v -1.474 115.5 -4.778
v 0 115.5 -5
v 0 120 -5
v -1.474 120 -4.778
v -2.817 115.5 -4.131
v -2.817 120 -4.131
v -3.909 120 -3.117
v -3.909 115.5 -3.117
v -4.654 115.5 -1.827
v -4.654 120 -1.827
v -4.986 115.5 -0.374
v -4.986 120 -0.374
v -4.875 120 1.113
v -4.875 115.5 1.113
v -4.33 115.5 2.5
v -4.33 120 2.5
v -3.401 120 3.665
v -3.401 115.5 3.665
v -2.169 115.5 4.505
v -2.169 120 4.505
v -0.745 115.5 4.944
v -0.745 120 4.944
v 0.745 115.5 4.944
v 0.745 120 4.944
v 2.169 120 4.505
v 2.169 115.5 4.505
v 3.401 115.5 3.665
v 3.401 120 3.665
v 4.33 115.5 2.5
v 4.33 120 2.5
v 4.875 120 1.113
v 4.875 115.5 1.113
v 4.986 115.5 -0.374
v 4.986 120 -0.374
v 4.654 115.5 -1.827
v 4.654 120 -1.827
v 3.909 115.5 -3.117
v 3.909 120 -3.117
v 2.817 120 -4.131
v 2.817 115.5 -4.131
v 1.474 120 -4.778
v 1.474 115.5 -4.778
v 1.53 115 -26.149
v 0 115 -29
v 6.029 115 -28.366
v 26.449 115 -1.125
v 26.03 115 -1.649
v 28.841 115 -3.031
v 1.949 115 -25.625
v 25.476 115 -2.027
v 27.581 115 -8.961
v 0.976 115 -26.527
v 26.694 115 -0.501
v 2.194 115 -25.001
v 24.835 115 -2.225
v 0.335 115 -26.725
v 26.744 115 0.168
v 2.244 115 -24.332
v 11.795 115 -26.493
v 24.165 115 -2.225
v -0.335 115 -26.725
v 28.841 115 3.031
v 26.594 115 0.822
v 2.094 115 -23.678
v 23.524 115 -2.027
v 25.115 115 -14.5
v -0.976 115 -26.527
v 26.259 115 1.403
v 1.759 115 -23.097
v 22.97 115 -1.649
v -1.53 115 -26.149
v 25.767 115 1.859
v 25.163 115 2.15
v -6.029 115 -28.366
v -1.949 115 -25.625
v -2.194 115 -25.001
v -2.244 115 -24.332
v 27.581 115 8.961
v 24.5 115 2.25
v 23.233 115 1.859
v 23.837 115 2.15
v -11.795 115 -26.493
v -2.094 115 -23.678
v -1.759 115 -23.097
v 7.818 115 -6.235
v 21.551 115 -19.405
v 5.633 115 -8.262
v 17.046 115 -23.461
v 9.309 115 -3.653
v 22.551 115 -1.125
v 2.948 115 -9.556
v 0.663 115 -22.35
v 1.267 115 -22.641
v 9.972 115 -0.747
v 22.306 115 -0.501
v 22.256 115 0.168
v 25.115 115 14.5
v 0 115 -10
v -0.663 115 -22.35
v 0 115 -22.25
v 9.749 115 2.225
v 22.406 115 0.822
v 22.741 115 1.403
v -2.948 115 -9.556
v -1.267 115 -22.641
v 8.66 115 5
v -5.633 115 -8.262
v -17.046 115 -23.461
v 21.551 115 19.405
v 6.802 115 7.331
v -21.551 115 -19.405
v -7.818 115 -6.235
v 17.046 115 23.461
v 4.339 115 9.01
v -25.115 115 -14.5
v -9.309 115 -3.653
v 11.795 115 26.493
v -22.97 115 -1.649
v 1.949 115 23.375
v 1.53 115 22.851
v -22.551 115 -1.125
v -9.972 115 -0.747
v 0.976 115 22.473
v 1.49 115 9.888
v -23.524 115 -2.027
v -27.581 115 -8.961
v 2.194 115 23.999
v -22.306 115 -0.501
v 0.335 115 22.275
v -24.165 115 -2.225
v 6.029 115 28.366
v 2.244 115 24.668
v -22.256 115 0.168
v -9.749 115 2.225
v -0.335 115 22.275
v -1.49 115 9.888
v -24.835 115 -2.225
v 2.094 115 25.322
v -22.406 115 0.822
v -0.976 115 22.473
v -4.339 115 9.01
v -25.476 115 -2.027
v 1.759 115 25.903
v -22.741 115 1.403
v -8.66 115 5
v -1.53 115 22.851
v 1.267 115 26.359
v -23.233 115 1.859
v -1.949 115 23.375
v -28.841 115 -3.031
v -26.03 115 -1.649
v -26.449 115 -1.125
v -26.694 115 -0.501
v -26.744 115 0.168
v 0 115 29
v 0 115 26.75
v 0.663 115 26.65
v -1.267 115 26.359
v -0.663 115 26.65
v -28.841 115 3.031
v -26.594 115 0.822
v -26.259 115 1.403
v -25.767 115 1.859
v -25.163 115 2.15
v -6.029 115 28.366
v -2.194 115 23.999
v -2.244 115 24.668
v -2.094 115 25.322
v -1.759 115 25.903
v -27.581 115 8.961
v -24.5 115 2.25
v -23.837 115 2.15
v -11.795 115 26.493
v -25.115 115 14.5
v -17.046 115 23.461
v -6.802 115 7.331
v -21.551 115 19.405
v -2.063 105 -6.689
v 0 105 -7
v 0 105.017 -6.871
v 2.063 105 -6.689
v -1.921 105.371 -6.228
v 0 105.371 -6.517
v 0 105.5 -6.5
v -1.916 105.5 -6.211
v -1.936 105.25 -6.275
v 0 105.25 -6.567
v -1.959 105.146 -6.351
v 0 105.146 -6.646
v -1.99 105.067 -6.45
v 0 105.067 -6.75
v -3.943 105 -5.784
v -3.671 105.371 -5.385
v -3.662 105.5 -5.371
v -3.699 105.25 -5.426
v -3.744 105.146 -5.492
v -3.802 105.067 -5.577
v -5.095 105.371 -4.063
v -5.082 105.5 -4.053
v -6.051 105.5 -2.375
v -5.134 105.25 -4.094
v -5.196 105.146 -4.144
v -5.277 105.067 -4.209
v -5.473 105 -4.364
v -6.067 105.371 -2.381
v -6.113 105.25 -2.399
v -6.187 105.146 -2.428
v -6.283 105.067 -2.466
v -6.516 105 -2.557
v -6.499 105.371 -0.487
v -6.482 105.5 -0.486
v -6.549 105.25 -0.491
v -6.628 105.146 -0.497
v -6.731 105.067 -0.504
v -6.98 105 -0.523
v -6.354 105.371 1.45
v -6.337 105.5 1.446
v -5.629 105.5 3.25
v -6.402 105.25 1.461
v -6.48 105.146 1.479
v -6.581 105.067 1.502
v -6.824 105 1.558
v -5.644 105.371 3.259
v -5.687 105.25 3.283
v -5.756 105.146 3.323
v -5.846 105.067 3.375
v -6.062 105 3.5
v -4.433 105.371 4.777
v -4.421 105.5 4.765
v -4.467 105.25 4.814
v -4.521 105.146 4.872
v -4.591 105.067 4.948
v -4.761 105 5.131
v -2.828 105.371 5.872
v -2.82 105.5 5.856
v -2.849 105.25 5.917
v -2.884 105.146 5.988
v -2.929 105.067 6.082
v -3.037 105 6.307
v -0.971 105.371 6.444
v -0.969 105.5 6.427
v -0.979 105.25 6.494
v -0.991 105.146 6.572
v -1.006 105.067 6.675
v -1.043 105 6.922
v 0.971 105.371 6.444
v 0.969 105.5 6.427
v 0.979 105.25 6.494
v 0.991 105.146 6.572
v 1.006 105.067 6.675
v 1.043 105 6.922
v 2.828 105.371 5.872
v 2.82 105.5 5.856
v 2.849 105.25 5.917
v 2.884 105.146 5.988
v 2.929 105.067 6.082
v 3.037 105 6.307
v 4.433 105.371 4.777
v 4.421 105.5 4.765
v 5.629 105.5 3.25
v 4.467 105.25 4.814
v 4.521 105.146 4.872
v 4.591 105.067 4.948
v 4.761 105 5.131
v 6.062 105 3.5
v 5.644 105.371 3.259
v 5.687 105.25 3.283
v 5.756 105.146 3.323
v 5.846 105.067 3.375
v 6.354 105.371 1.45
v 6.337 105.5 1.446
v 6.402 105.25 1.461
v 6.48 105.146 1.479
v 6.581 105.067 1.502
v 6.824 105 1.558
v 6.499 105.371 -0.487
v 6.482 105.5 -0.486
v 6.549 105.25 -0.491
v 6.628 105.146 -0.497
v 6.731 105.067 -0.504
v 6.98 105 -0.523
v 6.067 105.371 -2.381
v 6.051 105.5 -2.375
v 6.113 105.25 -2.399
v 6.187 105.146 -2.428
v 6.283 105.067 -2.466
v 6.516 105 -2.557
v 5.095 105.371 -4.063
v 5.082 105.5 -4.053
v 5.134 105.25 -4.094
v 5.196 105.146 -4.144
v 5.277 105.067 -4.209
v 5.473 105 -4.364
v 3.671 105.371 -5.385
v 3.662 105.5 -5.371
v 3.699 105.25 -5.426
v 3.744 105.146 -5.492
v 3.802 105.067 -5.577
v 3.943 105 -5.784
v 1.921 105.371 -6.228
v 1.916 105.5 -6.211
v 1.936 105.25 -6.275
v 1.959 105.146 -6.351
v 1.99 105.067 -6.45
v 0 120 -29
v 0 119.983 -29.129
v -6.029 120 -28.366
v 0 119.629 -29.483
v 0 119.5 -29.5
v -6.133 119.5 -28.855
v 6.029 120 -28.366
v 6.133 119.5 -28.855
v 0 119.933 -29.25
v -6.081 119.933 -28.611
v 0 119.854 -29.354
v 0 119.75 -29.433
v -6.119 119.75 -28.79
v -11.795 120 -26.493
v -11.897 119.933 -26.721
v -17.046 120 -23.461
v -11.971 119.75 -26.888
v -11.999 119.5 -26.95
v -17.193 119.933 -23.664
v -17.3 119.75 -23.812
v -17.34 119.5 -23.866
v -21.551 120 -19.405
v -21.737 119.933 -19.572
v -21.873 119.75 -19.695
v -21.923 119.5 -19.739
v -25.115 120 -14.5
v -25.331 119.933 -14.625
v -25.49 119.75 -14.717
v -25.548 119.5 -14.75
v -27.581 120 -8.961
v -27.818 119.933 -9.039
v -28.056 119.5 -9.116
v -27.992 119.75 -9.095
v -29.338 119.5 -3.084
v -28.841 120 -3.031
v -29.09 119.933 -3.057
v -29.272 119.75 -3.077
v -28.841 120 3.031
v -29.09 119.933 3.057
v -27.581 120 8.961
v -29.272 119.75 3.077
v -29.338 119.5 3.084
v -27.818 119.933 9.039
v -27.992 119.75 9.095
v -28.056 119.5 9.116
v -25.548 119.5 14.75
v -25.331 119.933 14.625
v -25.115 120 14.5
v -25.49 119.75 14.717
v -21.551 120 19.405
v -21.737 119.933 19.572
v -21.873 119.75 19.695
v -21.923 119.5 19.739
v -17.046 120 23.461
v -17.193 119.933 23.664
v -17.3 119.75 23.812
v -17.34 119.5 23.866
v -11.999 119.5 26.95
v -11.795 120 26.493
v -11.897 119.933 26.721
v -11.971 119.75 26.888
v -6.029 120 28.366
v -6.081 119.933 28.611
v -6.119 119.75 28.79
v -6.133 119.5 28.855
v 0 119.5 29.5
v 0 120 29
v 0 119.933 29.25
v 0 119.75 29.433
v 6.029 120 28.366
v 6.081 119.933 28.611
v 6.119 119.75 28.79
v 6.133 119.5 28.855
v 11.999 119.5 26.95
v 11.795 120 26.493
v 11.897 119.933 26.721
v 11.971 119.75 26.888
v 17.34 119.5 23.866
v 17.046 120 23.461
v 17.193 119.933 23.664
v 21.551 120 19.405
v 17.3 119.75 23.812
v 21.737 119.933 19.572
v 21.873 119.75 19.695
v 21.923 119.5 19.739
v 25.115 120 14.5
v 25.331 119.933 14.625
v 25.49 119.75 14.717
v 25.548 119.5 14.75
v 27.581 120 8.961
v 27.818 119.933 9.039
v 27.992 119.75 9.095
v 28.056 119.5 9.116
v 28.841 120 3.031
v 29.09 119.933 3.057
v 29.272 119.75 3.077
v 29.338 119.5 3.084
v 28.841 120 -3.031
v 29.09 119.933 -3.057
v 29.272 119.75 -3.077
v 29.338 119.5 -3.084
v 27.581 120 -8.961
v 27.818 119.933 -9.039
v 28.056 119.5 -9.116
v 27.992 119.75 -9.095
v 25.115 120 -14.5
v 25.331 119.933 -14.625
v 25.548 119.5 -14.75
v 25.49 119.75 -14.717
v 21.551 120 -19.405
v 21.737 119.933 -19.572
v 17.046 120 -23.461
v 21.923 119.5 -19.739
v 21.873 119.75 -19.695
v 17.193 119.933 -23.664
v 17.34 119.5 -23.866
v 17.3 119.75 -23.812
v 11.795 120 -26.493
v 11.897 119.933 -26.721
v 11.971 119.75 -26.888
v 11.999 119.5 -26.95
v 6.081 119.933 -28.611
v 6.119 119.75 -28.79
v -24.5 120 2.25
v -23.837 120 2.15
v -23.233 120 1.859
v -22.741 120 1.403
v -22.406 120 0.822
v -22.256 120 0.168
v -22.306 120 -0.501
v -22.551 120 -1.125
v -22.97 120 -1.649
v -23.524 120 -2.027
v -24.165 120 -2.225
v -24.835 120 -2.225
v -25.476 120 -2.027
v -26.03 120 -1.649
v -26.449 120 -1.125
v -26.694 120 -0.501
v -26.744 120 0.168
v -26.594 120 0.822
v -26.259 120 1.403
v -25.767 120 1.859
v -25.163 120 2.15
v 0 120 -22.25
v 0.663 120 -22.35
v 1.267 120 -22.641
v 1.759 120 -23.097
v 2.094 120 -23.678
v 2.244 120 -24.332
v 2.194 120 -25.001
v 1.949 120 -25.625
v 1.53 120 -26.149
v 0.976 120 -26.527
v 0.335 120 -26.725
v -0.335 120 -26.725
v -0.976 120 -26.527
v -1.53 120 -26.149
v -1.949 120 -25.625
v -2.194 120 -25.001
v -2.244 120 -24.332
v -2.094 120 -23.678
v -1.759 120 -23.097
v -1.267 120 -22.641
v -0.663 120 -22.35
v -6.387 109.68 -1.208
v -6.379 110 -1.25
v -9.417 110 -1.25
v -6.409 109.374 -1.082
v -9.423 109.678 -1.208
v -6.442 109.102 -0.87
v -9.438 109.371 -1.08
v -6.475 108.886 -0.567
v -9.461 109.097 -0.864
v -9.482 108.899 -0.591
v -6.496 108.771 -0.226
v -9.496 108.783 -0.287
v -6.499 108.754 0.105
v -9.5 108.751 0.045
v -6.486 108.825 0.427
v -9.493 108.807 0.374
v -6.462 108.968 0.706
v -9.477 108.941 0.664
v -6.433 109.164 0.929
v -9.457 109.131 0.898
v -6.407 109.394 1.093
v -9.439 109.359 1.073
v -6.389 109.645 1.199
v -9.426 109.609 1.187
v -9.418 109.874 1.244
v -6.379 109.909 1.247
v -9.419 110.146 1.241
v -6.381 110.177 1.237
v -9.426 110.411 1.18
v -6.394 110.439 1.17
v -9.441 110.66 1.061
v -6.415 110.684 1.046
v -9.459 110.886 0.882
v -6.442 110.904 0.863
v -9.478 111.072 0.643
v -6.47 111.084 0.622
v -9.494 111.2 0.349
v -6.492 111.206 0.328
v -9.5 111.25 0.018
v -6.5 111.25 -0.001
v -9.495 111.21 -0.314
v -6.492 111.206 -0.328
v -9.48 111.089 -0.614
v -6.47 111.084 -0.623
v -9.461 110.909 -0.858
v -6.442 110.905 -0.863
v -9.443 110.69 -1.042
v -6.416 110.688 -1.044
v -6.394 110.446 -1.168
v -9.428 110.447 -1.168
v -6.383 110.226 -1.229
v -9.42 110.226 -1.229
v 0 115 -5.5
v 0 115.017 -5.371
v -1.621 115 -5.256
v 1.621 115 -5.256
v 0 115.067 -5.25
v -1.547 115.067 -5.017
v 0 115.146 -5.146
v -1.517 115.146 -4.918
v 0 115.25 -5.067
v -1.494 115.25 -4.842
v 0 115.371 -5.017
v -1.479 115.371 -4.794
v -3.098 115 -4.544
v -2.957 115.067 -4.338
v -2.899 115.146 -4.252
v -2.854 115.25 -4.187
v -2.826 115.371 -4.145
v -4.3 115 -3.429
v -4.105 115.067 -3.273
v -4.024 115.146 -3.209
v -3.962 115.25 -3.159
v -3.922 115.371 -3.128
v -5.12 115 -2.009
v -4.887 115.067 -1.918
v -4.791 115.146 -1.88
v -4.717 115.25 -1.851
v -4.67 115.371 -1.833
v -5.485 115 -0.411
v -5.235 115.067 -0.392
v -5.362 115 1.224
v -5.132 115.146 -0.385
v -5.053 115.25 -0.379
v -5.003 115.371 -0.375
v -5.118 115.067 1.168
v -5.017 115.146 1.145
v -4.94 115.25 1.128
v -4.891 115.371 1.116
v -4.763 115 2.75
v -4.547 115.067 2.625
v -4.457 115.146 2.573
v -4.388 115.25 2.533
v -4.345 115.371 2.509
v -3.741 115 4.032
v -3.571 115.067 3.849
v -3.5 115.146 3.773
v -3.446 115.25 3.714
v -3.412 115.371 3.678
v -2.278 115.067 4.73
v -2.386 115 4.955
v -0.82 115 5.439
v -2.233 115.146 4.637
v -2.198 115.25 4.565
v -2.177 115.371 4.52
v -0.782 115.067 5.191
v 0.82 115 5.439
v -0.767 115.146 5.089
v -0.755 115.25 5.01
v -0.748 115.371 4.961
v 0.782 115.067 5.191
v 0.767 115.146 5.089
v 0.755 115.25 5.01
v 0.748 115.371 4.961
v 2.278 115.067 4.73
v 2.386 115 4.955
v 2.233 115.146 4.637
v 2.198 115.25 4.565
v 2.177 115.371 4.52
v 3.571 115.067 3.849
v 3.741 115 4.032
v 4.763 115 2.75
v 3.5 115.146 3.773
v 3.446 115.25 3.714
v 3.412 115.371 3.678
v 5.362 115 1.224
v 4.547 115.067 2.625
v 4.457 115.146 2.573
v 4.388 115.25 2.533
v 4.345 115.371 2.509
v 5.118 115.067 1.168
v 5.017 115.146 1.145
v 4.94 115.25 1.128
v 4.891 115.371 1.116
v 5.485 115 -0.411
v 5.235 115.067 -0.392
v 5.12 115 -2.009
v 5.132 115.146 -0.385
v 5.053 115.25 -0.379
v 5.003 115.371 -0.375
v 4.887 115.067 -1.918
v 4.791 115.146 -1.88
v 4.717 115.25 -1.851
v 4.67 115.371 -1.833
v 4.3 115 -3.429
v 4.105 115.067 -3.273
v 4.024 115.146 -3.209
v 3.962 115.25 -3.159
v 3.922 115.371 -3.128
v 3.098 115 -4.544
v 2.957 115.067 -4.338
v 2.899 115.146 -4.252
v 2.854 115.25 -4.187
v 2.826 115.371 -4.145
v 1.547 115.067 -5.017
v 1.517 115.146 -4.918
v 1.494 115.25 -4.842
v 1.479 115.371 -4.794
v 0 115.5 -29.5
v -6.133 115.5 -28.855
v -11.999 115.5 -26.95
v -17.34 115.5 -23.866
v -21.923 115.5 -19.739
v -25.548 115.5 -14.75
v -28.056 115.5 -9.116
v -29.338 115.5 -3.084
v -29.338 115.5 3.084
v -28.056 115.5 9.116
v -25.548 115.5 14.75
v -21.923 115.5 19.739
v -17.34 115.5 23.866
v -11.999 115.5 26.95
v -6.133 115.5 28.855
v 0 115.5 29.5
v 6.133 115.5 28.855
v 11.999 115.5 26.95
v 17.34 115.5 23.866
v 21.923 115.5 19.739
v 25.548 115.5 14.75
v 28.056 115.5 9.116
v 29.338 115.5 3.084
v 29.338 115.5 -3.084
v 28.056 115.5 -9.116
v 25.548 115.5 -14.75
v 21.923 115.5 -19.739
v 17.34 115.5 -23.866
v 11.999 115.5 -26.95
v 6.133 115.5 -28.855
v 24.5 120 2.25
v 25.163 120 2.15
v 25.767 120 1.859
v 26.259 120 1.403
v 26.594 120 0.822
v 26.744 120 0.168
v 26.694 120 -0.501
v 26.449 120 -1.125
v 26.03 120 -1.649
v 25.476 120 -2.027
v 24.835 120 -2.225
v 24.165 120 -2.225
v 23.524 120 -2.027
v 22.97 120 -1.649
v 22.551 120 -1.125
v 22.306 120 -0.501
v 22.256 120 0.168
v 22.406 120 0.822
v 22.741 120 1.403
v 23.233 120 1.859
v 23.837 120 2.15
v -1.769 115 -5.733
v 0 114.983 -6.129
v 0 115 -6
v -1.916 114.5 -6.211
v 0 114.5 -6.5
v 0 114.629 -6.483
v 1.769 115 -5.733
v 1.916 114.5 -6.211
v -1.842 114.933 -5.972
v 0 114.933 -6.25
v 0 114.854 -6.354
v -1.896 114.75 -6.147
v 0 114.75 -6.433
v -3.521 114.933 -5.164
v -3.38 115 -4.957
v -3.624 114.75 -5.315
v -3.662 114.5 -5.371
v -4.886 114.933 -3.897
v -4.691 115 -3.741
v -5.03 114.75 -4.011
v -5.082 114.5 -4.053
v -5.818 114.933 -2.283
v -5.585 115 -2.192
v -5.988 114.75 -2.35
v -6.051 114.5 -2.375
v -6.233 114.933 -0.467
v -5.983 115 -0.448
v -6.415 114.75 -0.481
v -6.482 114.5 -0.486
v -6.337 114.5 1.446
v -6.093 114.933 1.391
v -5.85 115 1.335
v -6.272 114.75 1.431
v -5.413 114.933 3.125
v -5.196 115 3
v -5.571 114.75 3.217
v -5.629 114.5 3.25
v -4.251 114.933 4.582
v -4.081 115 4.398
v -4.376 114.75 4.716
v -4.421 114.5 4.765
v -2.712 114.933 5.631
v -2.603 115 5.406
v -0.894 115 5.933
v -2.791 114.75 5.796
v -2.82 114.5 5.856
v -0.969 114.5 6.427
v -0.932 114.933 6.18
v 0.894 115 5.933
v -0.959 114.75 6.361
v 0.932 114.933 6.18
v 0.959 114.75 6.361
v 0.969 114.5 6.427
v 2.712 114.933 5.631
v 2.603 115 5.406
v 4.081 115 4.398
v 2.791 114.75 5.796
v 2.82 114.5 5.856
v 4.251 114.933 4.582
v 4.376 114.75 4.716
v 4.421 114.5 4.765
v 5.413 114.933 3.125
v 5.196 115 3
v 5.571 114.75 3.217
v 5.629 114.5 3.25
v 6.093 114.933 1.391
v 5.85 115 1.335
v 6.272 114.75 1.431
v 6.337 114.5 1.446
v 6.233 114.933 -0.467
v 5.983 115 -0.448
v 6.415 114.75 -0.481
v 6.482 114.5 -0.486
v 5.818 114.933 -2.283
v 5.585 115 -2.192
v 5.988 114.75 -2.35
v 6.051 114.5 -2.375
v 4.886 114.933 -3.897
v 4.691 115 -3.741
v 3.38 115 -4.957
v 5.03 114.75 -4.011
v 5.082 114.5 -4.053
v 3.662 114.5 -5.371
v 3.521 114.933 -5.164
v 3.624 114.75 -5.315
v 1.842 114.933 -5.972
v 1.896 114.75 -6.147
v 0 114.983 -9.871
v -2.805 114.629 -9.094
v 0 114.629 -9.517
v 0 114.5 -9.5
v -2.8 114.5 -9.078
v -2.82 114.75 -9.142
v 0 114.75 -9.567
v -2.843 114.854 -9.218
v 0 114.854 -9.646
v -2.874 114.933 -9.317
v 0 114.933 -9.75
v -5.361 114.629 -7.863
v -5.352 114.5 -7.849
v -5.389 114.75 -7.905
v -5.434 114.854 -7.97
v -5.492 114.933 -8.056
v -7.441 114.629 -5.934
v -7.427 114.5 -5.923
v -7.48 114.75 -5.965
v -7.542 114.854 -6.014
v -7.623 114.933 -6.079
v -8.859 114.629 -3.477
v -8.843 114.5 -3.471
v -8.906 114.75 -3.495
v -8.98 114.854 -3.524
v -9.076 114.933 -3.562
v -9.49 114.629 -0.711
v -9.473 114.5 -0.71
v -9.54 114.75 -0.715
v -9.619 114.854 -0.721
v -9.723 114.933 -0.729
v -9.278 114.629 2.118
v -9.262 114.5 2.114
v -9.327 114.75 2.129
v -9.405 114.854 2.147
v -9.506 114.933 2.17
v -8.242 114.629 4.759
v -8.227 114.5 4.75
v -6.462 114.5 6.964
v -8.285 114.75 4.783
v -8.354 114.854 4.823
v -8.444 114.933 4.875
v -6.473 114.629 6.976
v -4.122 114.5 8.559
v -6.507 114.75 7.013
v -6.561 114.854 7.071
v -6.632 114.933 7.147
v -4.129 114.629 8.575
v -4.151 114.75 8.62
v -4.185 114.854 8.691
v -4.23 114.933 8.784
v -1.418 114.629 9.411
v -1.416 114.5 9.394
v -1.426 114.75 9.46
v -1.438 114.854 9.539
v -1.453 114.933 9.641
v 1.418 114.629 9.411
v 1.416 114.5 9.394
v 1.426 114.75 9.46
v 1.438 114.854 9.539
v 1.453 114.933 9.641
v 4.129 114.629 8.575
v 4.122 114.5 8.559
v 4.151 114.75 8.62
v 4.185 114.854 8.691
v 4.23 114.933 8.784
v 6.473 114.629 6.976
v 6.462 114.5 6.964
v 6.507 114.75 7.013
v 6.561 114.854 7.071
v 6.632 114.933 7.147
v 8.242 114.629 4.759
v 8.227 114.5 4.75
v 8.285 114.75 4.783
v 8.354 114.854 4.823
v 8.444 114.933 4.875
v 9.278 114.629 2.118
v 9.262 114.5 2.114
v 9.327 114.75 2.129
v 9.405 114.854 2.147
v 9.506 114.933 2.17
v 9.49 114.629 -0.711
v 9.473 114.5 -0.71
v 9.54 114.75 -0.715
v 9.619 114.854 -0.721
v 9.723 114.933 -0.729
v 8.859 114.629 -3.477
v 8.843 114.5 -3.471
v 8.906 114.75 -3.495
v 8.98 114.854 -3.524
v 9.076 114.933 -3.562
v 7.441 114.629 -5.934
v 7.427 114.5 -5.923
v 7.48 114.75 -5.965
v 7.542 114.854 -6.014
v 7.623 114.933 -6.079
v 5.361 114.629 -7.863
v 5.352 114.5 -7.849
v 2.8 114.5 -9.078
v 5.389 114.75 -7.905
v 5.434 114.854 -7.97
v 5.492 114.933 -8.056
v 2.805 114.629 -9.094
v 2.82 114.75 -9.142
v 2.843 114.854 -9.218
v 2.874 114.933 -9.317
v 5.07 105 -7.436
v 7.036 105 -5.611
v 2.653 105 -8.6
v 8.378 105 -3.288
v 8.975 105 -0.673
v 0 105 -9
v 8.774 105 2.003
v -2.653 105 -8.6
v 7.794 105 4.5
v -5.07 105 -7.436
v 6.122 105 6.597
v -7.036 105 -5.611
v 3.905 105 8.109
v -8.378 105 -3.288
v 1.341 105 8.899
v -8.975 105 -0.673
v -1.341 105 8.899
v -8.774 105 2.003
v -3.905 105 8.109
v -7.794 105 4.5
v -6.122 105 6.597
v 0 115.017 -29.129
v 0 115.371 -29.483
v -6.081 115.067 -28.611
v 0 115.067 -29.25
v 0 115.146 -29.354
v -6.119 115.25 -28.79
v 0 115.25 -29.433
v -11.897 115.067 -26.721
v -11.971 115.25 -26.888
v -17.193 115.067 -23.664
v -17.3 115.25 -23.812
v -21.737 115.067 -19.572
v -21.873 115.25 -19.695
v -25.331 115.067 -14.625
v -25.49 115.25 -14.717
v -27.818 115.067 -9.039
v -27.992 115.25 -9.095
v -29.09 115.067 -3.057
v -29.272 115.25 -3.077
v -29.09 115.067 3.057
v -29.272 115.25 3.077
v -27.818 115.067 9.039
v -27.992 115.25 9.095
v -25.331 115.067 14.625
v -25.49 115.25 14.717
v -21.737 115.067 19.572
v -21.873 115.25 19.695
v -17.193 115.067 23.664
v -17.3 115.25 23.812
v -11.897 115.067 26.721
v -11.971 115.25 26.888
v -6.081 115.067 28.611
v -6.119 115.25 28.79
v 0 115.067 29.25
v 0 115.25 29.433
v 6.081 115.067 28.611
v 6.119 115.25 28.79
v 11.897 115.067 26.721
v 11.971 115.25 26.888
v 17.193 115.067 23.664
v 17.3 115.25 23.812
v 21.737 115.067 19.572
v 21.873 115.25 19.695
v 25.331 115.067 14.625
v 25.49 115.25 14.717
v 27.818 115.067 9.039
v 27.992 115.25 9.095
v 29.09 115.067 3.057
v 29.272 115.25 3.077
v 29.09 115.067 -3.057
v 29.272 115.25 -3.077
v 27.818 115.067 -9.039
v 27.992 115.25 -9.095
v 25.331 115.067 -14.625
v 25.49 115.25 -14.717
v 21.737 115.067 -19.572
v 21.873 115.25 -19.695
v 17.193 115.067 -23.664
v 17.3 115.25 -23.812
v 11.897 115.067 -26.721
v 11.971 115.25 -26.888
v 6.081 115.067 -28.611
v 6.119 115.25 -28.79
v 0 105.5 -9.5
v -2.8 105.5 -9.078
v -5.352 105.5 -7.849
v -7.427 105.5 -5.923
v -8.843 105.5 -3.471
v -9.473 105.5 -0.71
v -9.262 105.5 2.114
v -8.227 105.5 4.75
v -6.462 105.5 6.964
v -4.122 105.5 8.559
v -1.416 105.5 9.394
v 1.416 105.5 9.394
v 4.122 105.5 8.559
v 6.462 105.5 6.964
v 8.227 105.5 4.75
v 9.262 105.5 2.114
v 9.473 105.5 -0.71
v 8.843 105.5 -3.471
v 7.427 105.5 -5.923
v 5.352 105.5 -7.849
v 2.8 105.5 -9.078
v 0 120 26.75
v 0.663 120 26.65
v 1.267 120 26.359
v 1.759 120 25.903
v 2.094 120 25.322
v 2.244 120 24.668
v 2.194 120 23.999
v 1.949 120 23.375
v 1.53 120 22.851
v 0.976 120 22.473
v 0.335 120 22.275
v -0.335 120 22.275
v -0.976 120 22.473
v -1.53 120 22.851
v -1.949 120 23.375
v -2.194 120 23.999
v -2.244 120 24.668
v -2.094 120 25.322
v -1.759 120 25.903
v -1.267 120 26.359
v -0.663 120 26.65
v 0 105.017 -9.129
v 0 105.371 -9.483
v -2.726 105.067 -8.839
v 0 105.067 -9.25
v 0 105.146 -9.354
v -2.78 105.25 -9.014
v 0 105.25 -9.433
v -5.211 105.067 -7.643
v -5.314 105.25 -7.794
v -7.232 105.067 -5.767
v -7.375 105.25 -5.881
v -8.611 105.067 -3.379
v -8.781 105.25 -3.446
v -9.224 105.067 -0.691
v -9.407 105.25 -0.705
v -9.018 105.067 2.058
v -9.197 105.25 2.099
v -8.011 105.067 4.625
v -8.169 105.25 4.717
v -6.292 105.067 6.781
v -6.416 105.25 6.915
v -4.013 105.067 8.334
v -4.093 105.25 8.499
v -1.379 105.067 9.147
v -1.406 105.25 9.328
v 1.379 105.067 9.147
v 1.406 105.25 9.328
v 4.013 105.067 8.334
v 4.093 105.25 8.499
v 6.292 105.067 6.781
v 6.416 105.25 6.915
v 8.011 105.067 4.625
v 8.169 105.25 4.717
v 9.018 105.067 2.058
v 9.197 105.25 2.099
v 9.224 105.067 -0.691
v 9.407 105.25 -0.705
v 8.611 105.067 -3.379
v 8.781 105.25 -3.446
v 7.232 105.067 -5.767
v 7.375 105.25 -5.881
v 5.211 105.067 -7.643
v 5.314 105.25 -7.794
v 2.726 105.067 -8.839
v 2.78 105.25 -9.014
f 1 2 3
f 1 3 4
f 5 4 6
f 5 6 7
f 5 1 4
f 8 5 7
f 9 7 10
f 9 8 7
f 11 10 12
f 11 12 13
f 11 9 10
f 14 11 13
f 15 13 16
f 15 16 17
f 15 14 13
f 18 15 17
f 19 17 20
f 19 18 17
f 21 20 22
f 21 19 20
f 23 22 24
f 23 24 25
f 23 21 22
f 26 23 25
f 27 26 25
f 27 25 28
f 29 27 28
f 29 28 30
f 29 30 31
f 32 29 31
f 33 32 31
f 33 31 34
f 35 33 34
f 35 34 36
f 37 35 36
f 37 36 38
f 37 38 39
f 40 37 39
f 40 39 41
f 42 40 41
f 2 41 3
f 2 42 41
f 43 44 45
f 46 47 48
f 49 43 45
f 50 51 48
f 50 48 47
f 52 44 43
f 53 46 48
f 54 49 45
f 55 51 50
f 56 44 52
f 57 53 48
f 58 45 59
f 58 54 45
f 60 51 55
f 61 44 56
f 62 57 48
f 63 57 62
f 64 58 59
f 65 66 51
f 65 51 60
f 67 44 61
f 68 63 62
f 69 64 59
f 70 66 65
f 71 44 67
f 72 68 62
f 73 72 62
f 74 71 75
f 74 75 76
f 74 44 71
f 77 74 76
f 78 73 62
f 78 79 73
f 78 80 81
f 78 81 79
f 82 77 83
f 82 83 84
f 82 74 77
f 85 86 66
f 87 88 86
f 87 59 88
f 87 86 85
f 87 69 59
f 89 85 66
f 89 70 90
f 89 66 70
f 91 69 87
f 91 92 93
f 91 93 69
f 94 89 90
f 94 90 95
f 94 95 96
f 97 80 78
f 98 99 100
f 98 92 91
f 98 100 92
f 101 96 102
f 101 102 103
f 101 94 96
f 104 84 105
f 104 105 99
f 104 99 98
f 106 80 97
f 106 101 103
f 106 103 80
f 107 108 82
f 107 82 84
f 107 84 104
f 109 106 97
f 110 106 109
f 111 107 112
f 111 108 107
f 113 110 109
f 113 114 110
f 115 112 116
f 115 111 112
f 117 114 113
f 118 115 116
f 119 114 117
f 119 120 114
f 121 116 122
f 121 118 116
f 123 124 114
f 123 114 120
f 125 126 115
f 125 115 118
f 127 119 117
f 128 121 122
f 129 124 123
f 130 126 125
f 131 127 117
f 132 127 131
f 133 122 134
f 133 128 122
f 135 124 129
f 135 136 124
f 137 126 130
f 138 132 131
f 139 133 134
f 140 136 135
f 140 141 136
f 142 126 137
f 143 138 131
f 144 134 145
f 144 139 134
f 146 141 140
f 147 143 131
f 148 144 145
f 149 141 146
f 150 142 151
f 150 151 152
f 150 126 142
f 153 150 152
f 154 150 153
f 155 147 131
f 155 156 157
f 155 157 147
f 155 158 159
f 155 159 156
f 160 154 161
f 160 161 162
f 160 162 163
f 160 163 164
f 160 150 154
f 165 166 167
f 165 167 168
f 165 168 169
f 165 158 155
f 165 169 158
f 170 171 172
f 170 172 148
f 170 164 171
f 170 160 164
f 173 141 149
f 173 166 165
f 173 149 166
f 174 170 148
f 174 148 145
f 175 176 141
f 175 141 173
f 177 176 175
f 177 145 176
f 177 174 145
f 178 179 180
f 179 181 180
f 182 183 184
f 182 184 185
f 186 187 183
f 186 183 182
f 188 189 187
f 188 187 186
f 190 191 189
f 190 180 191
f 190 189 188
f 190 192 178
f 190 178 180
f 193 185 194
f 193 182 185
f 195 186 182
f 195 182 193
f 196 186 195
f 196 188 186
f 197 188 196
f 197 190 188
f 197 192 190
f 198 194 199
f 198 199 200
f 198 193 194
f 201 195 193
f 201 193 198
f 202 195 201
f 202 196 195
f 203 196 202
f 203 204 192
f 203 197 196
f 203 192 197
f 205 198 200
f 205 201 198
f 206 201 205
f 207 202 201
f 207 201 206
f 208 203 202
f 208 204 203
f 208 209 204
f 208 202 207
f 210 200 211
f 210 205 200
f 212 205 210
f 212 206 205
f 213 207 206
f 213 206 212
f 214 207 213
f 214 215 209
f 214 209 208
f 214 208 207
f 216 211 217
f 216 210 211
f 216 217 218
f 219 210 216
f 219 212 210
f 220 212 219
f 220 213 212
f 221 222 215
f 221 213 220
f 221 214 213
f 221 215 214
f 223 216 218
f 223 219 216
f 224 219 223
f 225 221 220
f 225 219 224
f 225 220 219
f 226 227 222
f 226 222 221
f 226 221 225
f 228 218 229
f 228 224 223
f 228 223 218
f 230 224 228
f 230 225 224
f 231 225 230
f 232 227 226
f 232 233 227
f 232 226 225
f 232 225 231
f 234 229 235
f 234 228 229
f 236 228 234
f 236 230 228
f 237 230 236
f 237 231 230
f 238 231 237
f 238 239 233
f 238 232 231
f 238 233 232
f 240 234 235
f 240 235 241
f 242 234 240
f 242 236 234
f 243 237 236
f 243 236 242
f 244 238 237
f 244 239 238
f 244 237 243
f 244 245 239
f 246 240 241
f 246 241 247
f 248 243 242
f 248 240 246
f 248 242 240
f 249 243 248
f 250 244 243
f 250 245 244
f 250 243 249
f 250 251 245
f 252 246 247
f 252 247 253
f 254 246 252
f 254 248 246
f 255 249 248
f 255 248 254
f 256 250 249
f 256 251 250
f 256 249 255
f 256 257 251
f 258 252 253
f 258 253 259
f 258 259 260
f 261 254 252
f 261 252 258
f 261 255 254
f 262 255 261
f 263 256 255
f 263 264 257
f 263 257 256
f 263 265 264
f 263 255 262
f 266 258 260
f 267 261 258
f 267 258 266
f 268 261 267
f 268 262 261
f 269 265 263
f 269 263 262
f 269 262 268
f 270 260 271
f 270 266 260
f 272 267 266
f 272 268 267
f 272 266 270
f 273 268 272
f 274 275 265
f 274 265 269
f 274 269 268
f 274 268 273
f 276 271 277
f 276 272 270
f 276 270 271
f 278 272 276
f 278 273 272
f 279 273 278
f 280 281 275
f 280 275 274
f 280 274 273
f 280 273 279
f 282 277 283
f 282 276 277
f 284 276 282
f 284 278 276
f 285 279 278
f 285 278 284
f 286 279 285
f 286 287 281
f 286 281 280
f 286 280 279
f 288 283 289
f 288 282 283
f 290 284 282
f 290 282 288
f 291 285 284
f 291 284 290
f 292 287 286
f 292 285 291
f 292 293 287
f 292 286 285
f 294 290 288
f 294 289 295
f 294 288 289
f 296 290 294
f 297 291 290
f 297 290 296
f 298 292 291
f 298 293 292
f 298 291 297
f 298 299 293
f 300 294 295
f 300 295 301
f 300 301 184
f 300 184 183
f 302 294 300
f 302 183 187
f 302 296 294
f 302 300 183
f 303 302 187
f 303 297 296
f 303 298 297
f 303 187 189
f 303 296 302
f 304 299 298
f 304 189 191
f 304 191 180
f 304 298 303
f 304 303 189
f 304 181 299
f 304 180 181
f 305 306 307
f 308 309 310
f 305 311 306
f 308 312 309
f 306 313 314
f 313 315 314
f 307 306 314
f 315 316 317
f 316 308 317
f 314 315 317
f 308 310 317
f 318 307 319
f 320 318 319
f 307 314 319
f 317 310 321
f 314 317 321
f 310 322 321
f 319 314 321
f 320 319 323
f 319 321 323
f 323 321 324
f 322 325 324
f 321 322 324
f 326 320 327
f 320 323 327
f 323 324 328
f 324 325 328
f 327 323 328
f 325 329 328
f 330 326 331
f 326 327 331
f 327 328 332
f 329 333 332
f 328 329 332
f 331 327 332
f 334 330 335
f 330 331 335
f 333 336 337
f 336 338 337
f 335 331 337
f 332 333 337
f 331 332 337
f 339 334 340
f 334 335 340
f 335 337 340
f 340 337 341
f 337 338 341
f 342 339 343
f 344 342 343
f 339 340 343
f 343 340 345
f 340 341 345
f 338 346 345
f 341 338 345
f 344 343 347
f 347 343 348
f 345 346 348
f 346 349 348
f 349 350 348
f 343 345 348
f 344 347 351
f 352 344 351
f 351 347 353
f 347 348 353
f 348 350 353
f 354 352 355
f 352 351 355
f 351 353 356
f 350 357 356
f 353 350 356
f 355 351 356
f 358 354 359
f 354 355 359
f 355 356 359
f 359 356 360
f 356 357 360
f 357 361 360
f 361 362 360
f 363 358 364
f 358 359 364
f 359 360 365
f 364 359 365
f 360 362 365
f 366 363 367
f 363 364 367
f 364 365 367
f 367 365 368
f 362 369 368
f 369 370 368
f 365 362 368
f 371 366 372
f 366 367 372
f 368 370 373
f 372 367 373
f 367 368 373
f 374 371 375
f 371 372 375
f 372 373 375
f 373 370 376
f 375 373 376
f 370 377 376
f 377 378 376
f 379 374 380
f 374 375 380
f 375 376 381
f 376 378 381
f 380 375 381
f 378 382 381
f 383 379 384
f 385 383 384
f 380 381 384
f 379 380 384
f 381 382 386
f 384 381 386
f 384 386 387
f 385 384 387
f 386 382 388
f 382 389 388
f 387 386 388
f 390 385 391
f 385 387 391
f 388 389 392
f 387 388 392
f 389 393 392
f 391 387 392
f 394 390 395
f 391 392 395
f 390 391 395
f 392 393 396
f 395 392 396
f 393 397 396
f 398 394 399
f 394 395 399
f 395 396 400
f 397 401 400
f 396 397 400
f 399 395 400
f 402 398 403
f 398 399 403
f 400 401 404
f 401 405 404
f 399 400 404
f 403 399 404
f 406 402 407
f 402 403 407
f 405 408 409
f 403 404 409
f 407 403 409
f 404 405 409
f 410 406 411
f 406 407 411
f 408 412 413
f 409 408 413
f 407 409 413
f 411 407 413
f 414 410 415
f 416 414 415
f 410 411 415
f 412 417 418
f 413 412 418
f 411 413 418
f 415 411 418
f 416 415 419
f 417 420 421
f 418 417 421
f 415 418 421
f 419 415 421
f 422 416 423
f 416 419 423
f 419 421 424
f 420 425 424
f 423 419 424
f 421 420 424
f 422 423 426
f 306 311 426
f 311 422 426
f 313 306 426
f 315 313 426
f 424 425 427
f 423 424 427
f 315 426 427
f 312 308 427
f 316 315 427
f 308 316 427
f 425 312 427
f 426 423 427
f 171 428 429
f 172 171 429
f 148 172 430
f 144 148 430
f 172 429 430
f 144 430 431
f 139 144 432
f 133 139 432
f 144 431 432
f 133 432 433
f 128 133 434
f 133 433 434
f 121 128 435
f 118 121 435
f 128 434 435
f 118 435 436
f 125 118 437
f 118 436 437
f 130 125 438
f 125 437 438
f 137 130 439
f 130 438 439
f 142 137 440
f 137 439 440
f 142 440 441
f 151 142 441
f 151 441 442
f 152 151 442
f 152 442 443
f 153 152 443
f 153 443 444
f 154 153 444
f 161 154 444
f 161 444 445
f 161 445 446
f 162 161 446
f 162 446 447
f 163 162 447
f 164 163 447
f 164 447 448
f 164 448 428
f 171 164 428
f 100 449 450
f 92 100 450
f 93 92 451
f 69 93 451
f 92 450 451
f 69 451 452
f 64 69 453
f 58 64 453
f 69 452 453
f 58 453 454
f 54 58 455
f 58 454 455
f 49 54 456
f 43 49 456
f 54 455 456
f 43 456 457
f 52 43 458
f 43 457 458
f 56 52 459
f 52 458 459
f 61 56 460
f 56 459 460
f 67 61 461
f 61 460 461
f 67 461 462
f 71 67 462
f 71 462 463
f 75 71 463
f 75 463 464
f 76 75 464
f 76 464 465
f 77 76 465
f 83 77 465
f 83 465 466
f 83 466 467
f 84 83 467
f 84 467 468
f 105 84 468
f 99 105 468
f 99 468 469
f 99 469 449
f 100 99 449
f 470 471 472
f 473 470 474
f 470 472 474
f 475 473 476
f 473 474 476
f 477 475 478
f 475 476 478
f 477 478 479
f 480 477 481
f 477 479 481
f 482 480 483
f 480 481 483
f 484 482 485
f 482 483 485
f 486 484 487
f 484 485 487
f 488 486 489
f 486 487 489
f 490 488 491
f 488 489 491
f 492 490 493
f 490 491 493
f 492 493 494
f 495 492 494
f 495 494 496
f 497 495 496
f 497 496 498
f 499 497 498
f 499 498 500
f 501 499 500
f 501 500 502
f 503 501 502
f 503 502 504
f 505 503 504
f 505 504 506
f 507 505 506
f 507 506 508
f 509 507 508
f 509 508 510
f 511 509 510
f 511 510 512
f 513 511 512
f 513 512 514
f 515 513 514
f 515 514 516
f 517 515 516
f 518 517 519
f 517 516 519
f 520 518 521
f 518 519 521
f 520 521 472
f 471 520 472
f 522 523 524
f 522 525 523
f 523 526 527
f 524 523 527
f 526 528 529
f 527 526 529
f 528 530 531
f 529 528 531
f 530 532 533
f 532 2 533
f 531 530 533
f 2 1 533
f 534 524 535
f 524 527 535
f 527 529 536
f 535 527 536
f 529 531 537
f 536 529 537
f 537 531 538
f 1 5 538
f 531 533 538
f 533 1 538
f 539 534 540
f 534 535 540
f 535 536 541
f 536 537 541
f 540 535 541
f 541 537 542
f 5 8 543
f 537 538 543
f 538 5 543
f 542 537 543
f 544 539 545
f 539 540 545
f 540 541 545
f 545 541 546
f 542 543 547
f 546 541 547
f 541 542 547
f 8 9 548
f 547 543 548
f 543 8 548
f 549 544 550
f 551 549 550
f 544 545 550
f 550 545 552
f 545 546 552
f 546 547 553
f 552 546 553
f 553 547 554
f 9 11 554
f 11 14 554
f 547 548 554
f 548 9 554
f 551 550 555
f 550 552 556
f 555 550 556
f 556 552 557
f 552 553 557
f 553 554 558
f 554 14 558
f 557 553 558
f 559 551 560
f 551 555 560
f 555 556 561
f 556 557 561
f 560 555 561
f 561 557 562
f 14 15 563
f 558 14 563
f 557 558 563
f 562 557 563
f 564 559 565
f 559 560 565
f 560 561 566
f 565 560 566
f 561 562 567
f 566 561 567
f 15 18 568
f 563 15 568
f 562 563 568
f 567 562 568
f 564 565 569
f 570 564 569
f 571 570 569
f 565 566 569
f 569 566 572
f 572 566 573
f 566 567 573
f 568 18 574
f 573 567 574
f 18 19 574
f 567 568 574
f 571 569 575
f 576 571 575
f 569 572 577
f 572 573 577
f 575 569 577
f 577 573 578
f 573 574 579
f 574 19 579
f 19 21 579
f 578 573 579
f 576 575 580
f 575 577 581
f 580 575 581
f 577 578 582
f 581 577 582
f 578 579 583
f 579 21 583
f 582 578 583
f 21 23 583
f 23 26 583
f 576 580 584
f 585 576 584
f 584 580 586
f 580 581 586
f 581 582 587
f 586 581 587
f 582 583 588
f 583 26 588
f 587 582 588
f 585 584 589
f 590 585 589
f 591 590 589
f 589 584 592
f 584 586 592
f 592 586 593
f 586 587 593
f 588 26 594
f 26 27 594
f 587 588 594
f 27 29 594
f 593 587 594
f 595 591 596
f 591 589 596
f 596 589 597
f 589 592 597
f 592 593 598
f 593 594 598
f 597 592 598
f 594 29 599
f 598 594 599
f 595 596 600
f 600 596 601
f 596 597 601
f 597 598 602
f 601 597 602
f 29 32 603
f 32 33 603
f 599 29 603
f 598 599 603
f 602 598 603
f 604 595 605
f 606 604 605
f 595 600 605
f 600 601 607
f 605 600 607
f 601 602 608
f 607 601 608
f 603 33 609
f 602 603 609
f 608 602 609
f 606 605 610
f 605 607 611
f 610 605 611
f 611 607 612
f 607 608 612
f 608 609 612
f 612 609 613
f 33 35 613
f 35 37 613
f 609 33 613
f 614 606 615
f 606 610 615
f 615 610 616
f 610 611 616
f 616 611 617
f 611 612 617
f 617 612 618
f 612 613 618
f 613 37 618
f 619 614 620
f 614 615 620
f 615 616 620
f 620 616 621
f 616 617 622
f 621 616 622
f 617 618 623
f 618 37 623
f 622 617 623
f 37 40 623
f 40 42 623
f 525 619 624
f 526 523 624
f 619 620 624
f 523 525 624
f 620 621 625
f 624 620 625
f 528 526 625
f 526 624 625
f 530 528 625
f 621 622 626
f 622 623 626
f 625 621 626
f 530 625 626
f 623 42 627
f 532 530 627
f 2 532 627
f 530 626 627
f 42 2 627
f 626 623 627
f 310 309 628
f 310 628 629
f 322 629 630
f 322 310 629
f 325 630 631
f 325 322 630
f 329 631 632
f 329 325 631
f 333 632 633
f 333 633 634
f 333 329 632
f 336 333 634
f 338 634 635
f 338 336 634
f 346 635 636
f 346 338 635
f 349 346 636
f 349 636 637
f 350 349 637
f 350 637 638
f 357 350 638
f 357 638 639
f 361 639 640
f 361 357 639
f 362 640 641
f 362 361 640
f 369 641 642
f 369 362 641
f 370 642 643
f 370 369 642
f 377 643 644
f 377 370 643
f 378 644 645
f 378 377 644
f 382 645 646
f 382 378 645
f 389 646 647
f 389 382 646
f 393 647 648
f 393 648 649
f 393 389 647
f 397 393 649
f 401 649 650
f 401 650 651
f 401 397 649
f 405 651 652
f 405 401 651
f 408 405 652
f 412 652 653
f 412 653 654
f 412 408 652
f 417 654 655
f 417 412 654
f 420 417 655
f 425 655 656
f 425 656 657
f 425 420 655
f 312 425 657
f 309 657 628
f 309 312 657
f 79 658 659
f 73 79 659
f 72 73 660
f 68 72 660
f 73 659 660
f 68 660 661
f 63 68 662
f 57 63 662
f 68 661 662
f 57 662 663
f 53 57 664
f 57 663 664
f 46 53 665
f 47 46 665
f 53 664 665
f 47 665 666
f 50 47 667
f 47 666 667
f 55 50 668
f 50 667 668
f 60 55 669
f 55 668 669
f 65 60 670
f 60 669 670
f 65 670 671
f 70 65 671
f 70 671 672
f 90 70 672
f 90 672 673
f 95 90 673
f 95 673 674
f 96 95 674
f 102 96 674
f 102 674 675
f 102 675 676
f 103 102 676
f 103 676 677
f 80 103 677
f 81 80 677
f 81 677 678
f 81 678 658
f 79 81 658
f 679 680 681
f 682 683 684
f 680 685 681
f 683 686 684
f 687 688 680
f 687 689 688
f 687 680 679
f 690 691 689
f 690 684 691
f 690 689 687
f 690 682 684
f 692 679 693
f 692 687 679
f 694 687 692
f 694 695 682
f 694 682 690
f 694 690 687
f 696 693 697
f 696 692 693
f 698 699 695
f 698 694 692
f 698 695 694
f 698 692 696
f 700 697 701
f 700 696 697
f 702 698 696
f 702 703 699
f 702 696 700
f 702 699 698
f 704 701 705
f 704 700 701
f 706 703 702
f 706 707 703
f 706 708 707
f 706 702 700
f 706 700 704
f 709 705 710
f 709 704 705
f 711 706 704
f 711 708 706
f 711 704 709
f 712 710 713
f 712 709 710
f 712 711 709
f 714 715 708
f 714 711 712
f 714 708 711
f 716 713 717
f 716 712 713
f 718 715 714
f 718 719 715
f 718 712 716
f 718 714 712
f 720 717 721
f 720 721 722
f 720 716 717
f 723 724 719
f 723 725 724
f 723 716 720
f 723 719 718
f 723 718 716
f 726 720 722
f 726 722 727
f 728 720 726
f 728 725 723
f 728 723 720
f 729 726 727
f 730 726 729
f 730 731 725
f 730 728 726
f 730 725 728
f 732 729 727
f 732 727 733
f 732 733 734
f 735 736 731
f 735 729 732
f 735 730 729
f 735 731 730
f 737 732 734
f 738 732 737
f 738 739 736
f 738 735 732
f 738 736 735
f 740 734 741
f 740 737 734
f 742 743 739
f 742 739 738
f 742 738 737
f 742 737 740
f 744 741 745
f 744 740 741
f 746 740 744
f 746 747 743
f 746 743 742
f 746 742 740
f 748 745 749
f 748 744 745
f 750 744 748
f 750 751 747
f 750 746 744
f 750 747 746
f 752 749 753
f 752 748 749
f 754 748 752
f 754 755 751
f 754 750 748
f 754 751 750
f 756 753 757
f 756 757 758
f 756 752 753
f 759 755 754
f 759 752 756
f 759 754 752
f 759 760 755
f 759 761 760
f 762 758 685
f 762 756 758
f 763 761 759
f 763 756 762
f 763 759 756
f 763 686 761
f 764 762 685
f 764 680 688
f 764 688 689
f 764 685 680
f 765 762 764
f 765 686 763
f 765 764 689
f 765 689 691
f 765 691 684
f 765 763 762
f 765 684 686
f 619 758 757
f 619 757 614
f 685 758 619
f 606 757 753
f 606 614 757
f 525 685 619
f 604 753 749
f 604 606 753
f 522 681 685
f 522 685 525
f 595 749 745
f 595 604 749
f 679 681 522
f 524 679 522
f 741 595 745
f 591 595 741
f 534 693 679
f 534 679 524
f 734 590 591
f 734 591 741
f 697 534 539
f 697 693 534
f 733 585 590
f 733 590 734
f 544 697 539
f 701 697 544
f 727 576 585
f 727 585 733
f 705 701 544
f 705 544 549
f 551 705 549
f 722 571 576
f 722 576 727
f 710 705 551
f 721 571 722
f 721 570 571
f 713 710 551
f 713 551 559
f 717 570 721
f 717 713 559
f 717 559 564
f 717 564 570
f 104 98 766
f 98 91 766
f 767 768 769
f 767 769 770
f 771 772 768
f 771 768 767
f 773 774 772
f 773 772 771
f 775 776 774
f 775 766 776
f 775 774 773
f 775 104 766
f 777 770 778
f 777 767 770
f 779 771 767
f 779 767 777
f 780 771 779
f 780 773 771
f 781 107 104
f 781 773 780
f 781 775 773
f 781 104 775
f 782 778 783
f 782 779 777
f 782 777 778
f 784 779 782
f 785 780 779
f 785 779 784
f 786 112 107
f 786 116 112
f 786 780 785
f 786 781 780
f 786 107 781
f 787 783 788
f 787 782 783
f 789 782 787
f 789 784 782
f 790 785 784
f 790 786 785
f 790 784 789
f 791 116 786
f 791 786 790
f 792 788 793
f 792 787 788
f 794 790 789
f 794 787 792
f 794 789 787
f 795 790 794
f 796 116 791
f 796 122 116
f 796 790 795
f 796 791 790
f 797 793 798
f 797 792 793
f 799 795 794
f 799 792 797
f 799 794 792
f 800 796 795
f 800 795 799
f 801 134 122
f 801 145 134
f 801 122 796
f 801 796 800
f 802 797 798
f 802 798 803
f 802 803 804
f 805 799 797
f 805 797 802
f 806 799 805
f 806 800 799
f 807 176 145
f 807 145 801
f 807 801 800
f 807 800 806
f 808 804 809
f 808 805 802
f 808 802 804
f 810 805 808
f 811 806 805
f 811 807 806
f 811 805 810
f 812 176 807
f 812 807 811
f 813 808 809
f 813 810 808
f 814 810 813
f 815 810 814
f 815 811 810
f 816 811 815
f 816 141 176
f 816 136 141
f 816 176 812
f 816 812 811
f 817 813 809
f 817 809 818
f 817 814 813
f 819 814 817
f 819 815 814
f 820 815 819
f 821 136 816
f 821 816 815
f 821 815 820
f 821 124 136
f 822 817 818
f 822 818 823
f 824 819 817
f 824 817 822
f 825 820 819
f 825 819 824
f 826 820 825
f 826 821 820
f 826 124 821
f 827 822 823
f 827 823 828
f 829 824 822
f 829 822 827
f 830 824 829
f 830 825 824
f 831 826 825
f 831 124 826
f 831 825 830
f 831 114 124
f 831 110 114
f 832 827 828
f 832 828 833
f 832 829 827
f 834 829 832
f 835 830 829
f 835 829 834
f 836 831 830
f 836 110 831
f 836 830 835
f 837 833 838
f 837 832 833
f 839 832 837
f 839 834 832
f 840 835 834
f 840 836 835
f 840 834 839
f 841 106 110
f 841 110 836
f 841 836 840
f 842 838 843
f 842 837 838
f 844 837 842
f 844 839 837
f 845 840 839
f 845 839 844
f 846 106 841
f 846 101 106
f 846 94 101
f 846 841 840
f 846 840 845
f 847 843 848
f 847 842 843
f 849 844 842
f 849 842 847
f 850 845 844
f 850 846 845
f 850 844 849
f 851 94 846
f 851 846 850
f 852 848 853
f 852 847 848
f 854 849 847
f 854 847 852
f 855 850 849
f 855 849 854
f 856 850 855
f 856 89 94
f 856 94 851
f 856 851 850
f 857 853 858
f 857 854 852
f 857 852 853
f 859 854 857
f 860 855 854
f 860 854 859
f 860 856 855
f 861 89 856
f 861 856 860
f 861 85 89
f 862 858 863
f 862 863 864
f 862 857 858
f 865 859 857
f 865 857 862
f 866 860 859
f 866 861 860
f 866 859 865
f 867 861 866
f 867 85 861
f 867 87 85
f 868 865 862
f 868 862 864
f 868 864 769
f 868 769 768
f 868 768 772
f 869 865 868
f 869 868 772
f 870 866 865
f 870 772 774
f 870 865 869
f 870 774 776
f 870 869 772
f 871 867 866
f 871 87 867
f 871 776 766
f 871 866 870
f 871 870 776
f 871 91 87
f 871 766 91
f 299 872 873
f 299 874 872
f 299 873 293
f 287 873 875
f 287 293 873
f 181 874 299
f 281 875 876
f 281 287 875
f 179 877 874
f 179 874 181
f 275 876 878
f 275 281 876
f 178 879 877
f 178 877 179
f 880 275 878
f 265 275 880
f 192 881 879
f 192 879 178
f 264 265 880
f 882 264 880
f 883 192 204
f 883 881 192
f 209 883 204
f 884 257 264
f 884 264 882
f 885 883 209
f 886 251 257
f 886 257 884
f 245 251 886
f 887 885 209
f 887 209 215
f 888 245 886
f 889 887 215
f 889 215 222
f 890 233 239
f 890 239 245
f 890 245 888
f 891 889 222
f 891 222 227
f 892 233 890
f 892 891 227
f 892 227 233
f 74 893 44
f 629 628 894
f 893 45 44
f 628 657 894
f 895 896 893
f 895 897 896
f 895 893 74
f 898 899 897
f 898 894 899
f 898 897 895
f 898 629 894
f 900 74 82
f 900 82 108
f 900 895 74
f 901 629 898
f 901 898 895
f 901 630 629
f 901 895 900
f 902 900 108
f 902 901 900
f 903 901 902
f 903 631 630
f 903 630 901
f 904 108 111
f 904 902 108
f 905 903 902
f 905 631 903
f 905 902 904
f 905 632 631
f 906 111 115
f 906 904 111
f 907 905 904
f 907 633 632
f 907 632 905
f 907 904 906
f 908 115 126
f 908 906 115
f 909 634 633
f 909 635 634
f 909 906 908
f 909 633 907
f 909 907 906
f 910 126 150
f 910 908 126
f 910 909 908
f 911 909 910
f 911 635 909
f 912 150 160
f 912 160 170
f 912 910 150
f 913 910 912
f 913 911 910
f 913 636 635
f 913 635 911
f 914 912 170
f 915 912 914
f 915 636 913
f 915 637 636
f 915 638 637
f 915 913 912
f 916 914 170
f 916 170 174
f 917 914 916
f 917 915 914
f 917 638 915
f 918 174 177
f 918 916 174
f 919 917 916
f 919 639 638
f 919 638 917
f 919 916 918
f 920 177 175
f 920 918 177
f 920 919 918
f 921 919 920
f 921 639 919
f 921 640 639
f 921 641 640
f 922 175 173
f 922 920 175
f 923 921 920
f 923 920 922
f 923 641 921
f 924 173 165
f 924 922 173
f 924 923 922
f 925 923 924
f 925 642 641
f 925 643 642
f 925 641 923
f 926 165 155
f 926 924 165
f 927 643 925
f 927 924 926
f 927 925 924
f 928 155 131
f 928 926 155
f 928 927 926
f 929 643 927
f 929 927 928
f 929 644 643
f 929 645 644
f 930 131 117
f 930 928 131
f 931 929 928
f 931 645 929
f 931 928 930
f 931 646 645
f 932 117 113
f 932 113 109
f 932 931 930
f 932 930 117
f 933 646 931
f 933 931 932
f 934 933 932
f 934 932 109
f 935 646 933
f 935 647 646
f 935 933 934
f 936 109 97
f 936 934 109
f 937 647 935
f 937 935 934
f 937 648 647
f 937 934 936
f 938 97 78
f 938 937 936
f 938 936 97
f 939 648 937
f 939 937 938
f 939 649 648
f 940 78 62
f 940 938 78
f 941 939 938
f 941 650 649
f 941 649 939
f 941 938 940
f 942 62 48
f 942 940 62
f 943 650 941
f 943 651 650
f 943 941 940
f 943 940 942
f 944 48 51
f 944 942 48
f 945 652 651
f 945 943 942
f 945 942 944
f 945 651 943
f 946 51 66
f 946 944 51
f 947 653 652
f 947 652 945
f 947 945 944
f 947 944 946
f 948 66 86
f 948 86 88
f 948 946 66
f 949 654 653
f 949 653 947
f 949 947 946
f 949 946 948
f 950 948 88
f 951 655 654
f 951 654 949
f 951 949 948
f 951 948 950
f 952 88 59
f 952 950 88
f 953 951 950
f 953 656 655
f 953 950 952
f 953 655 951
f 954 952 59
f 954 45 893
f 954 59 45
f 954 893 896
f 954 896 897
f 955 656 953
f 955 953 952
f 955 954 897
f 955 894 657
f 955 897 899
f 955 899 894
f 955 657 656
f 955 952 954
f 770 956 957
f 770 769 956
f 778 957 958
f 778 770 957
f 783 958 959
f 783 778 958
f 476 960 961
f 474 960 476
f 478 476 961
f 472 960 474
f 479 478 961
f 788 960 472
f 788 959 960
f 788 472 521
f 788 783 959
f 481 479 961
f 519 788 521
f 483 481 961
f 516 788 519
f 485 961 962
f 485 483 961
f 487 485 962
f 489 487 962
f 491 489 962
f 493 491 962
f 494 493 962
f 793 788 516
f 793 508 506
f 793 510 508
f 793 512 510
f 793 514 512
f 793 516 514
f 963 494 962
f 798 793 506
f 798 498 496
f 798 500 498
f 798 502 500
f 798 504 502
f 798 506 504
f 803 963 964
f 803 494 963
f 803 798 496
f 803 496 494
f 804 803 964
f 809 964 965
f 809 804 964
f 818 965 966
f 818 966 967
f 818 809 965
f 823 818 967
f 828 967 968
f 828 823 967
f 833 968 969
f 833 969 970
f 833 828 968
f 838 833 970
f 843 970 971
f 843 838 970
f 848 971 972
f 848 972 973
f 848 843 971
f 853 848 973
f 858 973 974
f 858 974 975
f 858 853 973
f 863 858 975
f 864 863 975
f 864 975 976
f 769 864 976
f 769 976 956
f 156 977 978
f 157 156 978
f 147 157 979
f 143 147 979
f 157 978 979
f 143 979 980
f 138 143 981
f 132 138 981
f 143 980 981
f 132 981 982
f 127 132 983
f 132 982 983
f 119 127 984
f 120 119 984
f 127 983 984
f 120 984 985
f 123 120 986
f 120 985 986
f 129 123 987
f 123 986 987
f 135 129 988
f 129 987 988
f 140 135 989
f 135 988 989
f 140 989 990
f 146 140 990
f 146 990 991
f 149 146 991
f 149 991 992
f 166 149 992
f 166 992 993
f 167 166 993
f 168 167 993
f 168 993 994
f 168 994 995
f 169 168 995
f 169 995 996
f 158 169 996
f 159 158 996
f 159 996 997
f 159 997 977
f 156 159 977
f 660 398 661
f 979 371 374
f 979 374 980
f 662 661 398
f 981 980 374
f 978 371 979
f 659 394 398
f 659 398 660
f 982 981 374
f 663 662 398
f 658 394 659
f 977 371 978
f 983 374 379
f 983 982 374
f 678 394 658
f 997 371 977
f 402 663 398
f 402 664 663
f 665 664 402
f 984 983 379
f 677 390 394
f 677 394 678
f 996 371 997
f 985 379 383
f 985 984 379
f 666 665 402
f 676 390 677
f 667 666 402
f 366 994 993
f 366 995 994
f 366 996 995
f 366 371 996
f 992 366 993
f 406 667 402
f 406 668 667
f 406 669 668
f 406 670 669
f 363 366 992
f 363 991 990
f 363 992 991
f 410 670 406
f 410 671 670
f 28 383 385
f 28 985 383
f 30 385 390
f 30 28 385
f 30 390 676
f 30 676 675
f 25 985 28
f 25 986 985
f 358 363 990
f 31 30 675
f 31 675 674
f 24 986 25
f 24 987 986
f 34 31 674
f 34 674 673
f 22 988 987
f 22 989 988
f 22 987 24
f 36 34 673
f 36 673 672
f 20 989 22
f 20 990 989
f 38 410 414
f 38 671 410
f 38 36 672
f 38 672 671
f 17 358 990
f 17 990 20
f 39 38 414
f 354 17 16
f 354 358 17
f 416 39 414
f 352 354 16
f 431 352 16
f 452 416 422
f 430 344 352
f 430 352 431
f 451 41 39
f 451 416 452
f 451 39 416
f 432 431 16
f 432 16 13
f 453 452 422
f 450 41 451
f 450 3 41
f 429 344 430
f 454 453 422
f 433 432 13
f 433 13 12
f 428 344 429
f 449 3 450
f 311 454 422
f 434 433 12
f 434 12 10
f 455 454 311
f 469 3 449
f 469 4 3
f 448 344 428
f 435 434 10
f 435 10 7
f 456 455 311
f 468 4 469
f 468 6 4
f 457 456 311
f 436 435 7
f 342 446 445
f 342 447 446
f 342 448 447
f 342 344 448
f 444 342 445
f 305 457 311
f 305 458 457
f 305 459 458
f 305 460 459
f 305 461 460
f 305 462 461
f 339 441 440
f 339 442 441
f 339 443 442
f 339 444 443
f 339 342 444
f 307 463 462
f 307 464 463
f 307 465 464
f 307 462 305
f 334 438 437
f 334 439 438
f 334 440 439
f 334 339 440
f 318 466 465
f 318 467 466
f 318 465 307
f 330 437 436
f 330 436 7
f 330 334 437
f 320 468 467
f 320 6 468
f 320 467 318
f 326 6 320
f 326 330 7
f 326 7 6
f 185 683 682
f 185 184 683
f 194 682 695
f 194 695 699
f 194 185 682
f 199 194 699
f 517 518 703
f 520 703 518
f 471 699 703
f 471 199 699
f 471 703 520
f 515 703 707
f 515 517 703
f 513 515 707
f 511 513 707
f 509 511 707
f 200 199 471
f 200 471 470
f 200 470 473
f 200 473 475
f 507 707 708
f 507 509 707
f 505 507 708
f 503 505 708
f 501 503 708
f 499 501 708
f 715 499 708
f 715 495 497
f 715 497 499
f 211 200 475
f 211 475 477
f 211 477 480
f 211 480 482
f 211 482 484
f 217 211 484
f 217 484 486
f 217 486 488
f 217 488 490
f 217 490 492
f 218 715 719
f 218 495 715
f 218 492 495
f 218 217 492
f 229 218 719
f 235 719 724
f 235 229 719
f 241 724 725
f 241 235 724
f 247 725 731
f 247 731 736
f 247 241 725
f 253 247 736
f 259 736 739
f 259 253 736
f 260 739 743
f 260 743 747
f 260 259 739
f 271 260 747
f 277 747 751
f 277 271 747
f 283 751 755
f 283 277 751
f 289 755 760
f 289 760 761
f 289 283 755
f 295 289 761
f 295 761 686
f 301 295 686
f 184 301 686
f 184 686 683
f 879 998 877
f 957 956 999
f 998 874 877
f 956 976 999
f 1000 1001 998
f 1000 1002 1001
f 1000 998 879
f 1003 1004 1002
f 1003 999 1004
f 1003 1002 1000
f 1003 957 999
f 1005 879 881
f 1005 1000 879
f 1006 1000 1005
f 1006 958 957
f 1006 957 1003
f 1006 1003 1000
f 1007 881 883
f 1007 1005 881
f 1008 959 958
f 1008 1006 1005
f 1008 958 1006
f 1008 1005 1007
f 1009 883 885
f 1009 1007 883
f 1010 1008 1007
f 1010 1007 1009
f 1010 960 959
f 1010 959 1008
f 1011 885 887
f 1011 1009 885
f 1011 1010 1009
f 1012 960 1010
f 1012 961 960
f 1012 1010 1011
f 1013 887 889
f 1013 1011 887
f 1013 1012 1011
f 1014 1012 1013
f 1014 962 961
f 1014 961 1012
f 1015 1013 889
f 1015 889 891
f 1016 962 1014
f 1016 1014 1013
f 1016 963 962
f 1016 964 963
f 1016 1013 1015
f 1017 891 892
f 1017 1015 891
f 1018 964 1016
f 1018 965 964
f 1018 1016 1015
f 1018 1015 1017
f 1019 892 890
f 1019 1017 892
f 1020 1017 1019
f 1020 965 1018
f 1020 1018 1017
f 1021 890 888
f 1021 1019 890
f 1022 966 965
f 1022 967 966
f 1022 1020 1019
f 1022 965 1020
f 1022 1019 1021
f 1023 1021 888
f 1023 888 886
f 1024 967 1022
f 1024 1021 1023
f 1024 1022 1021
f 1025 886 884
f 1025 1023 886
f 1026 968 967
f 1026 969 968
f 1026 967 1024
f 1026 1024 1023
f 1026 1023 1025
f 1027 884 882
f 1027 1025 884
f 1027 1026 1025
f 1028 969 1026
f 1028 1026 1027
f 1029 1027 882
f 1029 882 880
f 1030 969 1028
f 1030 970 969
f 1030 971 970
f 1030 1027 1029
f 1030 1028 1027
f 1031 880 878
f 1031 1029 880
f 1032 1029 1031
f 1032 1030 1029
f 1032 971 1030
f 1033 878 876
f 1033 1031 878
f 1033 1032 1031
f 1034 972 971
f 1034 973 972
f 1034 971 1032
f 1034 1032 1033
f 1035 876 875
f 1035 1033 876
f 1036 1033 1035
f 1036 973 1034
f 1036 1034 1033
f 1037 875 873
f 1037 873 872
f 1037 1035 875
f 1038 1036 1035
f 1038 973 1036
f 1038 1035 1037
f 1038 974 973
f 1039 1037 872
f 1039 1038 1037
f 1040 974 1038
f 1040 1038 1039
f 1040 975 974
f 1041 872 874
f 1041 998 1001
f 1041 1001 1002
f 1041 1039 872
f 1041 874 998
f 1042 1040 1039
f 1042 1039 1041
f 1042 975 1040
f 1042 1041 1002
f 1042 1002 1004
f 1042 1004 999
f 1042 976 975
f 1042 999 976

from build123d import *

# Parameters (mm, degrees)
HOLE_WIZARD_M4_1_D     = 4.5
HOLE_WIZARD_M4_1_DEPTH = 20
HOLE_WIZARD_M4_1_TIP   = 1.351936393
FILLET_1_R             = 0.5
FILLET_2_R             = 0.5
HOLE_WIZARD_M3_1_D     = 2.5
HOLE_WIZARD_M3_1_DEPTH = 8.5
HOLE_WIZARD_M3_1_TIP   = 0.751075774


with BuildPart() as part:
    # 草图1 → 旋转1 (revolve)
    with BuildSketch(Plane.XY, mode=Mode.PRIVATE) as revolve_1_sk:
        Polygon((-6.5, 115), (-6.5, 105), (-9.5, 105), (-9.5, 115), (-29.5, 115), (-29.5, 120), (-5, 120), (-5, 115), align=None)
    revolve(revolve_1_sk.sketch.rotate(Axis((0, 105, 0), (0, 1, 0)), 270), axis=Axis((0, 105, 0), (0, 1, 0)))

    # M4 间隙孔1
    with Locations(Plane(origin=(-24.5, 115, 0), x_dir=(0, 0, -1), z_dir=(0, -1, 0))):
        with Locations((0, 0), (-24.5, 24.5), (0, 49), (24.5, 24.5)):
            Hole(HOLE_WIZARD_M4_1_D / 2, depth=HOLE_WIZARD_M4_1_DEPTH)
            with Locations((0, 0, -(HOLE_WIZARD_M4_1_DEPTH + HOLE_WIZARD_M4_1_TIP / 2))):  # 118° drill point
                Cone(0, HOLE_WIZARD_M4_1_D / 2, HOLE_WIZARD_M4_1_TIP, mode=Mode.SUBTRACT)

    # 圆角1
    fillet_1_edges = [part.edges().sort_by_distance(p)[0] for p in [
        (0, 105, 9.5),
        (0, 115, 9.5),
        (0, 115, 29.5),
        (0, 120, 29.5),
        (0, 115, 5),
    ]]
    fillet(fillet_1_edges, radius=FILLET_1_R)

    # 圆角2
    fillet_2_edges = [part.edges().sort_by_distance(p)[0] for p in [
        (0, 115, 6.5),
        (0, 105, 6.5),
    ]]
    fillet(fillet_2_edges, radius=FILLET_2_R)

    # M3 螺纹孔1
    with Locations(Plane(origin=(-6.5, 110, 0), x_dir=(0, 0, 1), z_dir=(1, 0, 0))):
        with Locations((0, 0)):
            Hole(HOLE_WIZARD_M3_1_D / 2, depth=HOLE_WIZARD_M3_1_DEPTH)
            with Locations((0, 0, -(HOLE_WIZARD_M3_1_DEPTH + HOLE_WIZARD_M3_1_TIP / 2))):  # 118° drill point
                Cone(0, HOLE_WIZARD_M3_1_D / 2, HOLE_WIZARD_M3_1_TIP, mode=Mode.SUBTRACT)


solid = part.part
